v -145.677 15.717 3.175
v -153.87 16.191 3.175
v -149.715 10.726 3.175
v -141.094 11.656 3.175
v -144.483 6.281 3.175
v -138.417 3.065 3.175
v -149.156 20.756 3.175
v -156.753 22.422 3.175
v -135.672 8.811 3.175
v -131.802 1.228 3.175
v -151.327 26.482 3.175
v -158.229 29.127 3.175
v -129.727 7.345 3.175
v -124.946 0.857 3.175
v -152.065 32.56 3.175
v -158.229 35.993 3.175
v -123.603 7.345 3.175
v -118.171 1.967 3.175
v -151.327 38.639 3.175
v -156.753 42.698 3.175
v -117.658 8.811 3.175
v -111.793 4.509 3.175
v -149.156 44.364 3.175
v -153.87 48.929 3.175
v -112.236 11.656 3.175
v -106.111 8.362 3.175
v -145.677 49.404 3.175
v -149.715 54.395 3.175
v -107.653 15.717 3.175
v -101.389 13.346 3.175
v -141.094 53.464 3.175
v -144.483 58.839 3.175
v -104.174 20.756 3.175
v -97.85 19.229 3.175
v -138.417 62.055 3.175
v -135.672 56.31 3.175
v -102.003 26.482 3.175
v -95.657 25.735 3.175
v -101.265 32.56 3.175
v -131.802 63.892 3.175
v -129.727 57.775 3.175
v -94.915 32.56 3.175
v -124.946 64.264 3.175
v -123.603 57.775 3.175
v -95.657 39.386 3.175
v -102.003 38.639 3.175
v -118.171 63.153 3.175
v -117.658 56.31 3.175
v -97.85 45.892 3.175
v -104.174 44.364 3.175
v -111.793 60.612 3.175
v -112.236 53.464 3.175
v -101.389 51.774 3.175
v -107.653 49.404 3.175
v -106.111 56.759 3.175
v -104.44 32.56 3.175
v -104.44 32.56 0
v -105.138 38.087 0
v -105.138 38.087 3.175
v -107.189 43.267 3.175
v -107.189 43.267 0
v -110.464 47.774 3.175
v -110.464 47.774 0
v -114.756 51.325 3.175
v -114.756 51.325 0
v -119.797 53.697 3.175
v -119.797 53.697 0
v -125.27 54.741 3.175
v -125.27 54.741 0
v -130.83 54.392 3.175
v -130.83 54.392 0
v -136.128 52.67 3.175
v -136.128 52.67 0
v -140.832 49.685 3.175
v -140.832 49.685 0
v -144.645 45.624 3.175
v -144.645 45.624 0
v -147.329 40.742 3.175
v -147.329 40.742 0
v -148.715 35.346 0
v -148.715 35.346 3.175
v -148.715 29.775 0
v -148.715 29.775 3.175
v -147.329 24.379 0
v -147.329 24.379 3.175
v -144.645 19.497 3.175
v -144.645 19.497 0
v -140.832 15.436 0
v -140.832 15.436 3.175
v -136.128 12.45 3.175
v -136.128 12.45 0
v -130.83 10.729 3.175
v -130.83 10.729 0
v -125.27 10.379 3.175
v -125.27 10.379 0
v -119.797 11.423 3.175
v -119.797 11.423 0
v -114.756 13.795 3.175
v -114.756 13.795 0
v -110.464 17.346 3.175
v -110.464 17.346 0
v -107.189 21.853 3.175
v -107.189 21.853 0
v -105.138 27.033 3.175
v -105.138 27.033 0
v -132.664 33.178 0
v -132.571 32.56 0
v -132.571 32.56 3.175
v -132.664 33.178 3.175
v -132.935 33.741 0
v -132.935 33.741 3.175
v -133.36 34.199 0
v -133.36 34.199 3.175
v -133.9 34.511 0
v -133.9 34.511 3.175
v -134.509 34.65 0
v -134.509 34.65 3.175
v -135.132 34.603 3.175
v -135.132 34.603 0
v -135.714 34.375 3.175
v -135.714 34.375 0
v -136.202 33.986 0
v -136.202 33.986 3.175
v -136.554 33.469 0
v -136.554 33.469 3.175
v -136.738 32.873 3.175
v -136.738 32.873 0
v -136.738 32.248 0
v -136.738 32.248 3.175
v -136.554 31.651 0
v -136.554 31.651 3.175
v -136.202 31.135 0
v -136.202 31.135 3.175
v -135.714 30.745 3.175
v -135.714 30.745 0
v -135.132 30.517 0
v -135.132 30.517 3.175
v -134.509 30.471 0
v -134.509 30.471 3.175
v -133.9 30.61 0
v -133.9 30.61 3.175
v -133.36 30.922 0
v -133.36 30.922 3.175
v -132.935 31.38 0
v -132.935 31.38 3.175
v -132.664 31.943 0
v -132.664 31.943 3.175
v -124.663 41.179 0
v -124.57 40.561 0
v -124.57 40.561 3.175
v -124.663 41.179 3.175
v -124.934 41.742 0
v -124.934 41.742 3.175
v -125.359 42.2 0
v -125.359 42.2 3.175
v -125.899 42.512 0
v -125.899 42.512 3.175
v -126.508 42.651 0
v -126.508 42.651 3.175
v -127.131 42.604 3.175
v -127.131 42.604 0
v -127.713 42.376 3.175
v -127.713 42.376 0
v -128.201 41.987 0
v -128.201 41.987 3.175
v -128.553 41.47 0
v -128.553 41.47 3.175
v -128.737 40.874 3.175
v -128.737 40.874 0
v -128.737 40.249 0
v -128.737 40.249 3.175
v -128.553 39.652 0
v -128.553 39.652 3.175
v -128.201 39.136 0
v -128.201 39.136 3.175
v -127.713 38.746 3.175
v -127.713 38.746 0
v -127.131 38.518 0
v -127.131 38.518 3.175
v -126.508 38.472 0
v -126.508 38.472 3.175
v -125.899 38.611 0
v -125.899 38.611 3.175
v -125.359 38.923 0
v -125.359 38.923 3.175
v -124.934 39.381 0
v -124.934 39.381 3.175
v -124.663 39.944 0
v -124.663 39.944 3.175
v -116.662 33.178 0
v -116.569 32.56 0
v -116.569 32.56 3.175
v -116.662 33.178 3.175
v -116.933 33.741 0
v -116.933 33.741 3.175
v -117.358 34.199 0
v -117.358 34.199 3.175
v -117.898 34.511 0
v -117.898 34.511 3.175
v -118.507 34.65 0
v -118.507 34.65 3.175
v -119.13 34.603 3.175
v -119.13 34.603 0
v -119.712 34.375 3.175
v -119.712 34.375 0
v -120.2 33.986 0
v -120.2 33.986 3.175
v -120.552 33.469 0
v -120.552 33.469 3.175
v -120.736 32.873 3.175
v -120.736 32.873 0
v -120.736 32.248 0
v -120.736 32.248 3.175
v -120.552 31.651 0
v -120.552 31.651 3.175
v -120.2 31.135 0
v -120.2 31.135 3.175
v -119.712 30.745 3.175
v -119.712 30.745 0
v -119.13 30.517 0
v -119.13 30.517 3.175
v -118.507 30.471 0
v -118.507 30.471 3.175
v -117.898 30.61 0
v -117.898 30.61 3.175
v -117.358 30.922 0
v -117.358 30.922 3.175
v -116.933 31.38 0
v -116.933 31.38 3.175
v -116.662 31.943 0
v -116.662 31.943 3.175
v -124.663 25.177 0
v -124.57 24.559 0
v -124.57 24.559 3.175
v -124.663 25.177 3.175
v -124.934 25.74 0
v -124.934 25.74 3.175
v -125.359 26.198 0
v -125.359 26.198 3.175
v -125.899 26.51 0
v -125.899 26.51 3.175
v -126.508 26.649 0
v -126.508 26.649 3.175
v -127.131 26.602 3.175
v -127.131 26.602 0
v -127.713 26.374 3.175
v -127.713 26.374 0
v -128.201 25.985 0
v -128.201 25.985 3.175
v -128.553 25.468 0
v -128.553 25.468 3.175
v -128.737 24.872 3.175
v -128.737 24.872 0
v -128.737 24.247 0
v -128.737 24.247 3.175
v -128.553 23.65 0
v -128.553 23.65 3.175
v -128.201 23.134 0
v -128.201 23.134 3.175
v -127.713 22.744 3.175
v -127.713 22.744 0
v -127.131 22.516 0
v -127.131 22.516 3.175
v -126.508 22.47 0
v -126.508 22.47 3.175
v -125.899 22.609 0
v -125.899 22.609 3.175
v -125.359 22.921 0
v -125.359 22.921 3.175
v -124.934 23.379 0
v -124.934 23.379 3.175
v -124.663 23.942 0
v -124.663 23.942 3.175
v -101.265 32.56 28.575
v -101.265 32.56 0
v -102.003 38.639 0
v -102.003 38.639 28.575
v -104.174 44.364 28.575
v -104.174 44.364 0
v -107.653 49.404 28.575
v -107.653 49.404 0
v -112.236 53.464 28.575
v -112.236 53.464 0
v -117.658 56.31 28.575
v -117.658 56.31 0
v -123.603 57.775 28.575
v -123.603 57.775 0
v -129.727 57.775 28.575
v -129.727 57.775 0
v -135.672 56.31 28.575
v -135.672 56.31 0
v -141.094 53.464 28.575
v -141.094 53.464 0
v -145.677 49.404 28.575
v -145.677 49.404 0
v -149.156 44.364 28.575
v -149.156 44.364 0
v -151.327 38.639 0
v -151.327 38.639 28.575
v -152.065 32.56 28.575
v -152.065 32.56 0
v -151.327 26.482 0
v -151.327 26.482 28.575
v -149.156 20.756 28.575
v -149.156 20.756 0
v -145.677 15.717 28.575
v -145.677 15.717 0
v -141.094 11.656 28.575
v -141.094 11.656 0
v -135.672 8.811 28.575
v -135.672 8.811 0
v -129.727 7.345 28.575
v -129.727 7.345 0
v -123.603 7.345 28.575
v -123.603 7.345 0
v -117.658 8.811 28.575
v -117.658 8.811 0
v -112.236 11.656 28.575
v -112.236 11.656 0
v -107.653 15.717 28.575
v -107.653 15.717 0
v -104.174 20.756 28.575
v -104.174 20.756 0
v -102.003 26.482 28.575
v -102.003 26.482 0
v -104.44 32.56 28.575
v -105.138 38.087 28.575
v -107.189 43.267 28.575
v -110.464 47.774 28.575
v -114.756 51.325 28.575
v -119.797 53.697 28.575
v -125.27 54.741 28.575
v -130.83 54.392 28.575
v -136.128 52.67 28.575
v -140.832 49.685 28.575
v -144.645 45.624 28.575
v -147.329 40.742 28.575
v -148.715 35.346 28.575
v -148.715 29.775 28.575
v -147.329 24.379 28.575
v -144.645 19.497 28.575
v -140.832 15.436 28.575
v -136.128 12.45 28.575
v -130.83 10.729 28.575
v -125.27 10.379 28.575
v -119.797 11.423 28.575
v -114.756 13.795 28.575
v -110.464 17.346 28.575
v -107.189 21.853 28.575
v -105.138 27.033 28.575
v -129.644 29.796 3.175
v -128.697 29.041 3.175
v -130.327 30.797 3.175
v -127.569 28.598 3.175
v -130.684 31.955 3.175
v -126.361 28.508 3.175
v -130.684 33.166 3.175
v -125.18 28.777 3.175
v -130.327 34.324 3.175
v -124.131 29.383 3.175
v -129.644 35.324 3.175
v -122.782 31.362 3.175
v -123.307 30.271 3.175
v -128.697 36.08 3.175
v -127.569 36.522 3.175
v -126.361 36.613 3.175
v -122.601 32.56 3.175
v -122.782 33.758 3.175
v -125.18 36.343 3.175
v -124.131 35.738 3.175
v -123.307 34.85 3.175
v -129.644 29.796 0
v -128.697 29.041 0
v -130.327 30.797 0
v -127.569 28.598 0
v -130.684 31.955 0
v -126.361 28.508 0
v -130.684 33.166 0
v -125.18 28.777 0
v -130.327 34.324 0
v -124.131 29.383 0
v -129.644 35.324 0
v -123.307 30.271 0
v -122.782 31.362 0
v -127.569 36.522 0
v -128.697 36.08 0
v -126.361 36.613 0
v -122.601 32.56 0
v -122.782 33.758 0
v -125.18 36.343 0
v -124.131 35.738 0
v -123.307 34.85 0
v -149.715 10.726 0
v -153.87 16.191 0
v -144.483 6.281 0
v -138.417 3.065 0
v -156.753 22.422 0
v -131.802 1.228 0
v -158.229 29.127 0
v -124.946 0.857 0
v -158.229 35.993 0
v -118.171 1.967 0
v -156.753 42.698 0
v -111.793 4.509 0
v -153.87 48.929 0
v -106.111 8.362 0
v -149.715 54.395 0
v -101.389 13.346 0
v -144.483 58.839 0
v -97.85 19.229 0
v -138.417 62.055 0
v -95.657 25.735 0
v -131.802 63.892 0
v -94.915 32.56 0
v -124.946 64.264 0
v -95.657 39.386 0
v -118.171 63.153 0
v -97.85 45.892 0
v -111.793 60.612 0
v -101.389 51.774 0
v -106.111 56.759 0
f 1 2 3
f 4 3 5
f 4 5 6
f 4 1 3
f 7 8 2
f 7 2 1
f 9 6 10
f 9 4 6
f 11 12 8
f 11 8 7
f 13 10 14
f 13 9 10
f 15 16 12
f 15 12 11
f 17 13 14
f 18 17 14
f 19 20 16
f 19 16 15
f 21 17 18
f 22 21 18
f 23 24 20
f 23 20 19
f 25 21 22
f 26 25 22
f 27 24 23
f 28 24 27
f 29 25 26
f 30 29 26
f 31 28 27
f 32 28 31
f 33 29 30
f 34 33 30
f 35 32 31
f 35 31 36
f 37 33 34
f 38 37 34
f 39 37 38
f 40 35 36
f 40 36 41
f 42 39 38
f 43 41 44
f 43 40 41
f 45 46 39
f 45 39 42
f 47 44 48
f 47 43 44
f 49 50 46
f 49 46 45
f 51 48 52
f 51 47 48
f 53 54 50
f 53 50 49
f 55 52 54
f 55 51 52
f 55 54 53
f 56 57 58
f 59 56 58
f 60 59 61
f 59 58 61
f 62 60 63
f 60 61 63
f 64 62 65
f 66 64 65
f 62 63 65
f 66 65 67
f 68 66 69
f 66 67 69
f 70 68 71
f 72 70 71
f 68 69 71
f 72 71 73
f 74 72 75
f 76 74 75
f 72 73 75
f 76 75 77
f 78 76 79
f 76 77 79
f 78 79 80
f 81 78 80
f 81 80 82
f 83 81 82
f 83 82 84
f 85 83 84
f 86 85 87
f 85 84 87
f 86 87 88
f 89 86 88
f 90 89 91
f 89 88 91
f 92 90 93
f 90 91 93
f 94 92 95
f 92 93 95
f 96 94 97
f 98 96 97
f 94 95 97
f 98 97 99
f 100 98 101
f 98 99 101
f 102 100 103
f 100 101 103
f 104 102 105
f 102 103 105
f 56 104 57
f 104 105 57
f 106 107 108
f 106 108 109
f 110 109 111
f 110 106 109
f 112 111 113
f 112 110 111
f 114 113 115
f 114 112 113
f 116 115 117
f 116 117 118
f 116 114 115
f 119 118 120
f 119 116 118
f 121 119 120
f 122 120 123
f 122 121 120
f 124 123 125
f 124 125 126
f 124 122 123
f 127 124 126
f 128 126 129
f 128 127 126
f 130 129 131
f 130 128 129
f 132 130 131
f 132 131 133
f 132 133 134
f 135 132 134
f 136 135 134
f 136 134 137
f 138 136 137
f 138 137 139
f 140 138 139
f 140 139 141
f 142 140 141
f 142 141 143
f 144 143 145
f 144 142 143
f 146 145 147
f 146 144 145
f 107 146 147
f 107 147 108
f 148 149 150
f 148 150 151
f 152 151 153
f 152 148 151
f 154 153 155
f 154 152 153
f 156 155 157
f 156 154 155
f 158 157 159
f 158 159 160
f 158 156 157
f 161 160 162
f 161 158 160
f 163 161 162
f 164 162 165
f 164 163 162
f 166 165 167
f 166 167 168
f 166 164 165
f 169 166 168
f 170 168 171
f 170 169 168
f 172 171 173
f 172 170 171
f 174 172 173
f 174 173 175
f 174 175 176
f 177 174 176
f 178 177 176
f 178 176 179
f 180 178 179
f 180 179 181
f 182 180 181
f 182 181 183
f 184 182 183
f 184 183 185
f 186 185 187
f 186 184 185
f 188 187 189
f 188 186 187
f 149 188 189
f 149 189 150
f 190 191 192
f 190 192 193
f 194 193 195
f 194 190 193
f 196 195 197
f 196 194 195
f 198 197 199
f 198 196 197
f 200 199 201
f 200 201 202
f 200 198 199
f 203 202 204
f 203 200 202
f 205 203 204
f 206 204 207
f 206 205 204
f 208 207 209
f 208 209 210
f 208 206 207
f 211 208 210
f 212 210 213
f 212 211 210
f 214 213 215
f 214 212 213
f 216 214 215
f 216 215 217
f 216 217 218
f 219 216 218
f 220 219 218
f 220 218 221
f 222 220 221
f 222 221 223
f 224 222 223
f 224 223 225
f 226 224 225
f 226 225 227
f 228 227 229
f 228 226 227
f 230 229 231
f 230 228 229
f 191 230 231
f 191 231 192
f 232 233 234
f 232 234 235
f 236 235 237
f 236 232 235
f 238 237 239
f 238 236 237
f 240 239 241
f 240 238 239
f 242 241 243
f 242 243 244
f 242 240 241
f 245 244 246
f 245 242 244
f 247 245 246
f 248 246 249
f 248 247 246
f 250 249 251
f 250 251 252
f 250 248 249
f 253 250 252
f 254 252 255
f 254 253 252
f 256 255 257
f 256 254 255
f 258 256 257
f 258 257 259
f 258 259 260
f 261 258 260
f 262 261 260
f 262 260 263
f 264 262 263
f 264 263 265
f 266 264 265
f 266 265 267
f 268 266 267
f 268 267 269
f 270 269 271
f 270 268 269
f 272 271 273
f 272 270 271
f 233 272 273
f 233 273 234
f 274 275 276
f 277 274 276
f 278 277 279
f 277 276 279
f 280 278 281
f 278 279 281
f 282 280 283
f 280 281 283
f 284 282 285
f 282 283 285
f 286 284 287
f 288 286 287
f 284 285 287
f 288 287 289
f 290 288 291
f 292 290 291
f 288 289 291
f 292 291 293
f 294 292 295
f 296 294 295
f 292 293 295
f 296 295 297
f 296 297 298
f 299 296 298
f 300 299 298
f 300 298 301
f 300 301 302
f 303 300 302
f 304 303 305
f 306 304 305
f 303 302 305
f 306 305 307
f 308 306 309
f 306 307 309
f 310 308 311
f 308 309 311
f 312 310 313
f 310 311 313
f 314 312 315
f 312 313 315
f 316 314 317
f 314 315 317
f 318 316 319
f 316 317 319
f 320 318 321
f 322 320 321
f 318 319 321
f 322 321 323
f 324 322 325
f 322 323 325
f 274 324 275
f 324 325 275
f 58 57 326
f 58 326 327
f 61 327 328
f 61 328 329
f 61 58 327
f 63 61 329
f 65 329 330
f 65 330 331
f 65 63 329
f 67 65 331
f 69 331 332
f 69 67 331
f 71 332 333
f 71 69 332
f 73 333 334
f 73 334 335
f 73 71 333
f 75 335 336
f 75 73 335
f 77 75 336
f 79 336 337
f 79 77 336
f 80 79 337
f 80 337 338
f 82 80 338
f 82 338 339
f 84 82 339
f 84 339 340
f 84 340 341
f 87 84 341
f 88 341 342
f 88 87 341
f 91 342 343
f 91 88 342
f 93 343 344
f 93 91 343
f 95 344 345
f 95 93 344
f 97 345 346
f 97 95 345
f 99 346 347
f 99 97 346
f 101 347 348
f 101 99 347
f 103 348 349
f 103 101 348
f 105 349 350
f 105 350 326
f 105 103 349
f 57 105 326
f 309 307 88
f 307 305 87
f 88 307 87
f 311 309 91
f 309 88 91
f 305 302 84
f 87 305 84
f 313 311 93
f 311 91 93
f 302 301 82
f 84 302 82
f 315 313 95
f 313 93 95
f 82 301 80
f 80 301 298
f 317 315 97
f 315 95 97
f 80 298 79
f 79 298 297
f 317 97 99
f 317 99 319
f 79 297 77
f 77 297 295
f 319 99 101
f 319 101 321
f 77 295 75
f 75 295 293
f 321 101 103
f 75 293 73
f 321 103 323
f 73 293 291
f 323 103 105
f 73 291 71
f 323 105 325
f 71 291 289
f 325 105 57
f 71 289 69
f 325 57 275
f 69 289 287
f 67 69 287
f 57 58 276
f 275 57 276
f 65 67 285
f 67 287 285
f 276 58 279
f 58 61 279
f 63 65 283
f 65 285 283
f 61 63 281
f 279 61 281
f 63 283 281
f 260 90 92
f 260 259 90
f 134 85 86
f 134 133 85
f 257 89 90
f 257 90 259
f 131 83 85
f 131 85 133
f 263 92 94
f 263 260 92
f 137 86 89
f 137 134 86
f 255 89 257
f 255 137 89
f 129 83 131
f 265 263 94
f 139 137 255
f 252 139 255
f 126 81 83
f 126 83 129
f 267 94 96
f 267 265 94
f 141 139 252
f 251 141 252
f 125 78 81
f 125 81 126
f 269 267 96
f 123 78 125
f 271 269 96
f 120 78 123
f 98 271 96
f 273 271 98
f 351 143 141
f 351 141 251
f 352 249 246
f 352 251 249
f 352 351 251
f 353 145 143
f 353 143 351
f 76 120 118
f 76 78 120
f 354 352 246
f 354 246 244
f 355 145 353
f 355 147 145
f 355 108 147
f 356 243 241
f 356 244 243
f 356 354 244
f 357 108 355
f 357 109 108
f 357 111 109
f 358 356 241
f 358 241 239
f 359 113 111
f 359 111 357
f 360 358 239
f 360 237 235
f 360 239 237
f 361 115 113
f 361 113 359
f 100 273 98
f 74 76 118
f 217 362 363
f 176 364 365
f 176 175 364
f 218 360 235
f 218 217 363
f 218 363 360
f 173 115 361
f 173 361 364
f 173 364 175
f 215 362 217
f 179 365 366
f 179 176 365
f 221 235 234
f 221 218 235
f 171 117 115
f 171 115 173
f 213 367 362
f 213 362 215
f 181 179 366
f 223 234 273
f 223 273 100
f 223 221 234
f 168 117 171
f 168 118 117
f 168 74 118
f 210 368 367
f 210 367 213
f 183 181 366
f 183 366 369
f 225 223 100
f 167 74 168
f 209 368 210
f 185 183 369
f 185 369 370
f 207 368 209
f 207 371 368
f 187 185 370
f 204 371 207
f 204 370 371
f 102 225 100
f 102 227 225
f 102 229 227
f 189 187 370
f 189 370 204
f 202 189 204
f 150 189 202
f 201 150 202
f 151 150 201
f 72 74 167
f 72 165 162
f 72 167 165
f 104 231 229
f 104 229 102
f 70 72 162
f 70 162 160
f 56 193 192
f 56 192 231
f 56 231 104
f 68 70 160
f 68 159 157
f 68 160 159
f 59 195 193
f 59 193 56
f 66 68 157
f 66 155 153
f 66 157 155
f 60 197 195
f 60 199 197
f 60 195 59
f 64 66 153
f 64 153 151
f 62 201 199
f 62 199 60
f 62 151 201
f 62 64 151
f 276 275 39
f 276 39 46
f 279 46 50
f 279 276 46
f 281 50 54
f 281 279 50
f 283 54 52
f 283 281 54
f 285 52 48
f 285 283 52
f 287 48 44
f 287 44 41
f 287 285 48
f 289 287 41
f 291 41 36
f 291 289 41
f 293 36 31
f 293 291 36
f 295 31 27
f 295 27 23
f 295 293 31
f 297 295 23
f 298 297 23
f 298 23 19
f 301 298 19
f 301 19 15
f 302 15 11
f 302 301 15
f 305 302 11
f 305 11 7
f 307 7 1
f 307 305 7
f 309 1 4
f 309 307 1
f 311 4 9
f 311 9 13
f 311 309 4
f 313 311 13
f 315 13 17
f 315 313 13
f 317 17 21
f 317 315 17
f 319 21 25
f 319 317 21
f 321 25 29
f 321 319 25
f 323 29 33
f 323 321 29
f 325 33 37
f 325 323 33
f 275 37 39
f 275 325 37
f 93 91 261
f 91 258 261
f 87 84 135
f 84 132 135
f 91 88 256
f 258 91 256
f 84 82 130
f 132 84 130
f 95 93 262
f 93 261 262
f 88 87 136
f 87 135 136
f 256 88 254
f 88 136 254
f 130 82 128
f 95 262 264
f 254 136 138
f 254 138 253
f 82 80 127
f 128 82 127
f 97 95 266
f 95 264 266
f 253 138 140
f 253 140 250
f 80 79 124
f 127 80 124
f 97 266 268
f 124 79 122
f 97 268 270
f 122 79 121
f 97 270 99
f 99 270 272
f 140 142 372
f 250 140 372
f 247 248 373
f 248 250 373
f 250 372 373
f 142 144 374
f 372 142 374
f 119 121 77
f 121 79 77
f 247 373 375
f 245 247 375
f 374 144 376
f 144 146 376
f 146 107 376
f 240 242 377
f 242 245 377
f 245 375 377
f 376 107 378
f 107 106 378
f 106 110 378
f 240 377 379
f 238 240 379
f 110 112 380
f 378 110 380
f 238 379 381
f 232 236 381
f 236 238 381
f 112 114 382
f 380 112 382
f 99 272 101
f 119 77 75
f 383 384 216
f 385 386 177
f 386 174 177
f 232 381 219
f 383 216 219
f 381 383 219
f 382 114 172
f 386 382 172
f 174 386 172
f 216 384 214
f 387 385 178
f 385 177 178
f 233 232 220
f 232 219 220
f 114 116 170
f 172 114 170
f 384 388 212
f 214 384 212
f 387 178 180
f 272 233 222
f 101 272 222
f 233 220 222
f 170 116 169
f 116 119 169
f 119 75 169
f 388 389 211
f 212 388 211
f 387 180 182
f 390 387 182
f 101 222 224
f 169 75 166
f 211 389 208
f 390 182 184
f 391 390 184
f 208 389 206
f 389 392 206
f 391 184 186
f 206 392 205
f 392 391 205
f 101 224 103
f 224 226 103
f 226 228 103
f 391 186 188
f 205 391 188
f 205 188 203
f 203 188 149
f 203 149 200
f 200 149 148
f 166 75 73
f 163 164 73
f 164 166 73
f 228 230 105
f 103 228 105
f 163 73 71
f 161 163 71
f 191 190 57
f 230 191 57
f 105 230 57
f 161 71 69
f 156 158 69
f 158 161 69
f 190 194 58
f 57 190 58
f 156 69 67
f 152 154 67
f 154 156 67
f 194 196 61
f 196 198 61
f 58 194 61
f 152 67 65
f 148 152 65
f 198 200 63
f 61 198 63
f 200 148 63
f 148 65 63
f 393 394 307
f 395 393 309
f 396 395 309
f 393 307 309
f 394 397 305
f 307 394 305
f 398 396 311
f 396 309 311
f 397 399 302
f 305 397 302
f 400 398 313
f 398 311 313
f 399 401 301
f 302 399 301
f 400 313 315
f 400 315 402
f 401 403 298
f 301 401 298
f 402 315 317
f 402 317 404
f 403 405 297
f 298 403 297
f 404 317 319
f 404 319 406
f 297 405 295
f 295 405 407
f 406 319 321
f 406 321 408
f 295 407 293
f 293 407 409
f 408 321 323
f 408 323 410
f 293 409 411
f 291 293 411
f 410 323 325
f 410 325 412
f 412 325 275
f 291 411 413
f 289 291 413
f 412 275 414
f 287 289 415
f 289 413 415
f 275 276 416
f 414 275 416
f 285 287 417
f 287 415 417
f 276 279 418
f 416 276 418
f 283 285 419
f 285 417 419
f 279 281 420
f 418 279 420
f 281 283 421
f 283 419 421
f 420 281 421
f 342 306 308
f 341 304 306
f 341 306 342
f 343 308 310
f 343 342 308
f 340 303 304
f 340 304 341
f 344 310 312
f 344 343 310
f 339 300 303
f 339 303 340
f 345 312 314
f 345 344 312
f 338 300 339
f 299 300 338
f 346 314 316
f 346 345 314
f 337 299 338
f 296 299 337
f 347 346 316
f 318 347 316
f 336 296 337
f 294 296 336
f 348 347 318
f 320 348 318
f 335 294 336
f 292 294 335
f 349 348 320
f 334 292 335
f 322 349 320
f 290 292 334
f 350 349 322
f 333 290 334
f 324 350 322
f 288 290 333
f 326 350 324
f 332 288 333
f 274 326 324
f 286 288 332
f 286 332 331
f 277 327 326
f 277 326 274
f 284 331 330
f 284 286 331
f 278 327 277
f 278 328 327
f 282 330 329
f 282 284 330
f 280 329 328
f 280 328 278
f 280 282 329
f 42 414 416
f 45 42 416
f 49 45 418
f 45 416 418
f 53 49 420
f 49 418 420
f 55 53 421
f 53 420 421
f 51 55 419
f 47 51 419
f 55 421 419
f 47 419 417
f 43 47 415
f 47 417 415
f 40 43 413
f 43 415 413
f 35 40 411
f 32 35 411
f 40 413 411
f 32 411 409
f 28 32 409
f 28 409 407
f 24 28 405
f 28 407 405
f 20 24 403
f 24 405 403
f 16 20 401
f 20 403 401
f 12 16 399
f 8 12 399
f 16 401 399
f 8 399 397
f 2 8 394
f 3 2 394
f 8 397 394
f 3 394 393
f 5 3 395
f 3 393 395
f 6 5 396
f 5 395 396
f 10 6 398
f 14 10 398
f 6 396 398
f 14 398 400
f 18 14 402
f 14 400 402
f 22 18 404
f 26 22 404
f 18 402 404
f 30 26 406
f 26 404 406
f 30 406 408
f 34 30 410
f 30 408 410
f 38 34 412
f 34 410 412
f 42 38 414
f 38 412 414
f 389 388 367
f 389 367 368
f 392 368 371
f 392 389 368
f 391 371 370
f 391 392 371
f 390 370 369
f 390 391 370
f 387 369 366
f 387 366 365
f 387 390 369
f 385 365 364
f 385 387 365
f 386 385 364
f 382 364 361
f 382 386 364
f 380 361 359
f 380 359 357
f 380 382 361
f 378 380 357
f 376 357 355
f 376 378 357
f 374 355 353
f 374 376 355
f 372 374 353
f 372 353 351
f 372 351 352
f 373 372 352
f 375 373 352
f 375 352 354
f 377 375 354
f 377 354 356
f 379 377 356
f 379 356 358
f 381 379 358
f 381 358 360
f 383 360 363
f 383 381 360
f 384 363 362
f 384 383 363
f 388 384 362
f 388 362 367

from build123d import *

# Parameters (mm, degrees)
F0_R     = 22.225005281
F0_R_2   = 2.0955
F0_R_3   = 4.064
F1_DEPTH = 3.175
F0_R_4   = 31.75
F0_R_5   = 25.400005281
F2_DEPTH = 28.575


with BuildPart() as f1:
    # F0 (on Top) → F1 (new body)
    with BuildSketch(Plane.XY):
        with Locations((-126.6650405397, 32.560210675)):
            Circle(F0_R)
        with Locations((-126.6650405397, 24.559210675)):
            Circle(F0_R_2, mode=Mode.SUBTRACT)
        with Locations((-134.6660405397, 32.560210675)):
            Circle(F0_R_2, mode=Mode.SUBTRACT)
        with Locations((-126.6650405397, 32.560210675)):
            Circle(F0_R_3, mode=Mode.SUBTRACT)
        with Locations((-118.6640405397, 32.560210675)):
            Circle(F0_R_2, mode=Mode.SUBTRACT)
        with Locations((-126.6650405397, 40.561210675)):
            Circle(F0_R_2, mode=Mode.SUBTRACT)
    extrude(amount=F1_DEPTH)


with BuildPart() as f1b:
    # F0 (on Top) → F1, piece 2 (new body)
    with BuildSketch(Plane.XY):
        with Locations((-126.6650405397, 32.560210675)):
            Circle(F0_R_4)
        with Locations((-126.6650405397, 32.560210675)):
            Circle(F0_R_5, mode=Mode.SUBTRACT)
    extrude(amount=F1_DEPTH)


with BuildPart() as f2:
    # F0 (on Top) → F2 (new body)
    with BuildSketch(Plane.XY):
        with Locations((-126.6650405397, 32.560210675)):
            Circle(F0_R_5)
        with Locations((-126.6650405397, 32.560210675)):
            Circle(F0_R, mode=Mode.SUBTRACT)
    extrude(amount=F2_DEPTH)


solid = Compound([f1.part, f1b.part, f2.part])
